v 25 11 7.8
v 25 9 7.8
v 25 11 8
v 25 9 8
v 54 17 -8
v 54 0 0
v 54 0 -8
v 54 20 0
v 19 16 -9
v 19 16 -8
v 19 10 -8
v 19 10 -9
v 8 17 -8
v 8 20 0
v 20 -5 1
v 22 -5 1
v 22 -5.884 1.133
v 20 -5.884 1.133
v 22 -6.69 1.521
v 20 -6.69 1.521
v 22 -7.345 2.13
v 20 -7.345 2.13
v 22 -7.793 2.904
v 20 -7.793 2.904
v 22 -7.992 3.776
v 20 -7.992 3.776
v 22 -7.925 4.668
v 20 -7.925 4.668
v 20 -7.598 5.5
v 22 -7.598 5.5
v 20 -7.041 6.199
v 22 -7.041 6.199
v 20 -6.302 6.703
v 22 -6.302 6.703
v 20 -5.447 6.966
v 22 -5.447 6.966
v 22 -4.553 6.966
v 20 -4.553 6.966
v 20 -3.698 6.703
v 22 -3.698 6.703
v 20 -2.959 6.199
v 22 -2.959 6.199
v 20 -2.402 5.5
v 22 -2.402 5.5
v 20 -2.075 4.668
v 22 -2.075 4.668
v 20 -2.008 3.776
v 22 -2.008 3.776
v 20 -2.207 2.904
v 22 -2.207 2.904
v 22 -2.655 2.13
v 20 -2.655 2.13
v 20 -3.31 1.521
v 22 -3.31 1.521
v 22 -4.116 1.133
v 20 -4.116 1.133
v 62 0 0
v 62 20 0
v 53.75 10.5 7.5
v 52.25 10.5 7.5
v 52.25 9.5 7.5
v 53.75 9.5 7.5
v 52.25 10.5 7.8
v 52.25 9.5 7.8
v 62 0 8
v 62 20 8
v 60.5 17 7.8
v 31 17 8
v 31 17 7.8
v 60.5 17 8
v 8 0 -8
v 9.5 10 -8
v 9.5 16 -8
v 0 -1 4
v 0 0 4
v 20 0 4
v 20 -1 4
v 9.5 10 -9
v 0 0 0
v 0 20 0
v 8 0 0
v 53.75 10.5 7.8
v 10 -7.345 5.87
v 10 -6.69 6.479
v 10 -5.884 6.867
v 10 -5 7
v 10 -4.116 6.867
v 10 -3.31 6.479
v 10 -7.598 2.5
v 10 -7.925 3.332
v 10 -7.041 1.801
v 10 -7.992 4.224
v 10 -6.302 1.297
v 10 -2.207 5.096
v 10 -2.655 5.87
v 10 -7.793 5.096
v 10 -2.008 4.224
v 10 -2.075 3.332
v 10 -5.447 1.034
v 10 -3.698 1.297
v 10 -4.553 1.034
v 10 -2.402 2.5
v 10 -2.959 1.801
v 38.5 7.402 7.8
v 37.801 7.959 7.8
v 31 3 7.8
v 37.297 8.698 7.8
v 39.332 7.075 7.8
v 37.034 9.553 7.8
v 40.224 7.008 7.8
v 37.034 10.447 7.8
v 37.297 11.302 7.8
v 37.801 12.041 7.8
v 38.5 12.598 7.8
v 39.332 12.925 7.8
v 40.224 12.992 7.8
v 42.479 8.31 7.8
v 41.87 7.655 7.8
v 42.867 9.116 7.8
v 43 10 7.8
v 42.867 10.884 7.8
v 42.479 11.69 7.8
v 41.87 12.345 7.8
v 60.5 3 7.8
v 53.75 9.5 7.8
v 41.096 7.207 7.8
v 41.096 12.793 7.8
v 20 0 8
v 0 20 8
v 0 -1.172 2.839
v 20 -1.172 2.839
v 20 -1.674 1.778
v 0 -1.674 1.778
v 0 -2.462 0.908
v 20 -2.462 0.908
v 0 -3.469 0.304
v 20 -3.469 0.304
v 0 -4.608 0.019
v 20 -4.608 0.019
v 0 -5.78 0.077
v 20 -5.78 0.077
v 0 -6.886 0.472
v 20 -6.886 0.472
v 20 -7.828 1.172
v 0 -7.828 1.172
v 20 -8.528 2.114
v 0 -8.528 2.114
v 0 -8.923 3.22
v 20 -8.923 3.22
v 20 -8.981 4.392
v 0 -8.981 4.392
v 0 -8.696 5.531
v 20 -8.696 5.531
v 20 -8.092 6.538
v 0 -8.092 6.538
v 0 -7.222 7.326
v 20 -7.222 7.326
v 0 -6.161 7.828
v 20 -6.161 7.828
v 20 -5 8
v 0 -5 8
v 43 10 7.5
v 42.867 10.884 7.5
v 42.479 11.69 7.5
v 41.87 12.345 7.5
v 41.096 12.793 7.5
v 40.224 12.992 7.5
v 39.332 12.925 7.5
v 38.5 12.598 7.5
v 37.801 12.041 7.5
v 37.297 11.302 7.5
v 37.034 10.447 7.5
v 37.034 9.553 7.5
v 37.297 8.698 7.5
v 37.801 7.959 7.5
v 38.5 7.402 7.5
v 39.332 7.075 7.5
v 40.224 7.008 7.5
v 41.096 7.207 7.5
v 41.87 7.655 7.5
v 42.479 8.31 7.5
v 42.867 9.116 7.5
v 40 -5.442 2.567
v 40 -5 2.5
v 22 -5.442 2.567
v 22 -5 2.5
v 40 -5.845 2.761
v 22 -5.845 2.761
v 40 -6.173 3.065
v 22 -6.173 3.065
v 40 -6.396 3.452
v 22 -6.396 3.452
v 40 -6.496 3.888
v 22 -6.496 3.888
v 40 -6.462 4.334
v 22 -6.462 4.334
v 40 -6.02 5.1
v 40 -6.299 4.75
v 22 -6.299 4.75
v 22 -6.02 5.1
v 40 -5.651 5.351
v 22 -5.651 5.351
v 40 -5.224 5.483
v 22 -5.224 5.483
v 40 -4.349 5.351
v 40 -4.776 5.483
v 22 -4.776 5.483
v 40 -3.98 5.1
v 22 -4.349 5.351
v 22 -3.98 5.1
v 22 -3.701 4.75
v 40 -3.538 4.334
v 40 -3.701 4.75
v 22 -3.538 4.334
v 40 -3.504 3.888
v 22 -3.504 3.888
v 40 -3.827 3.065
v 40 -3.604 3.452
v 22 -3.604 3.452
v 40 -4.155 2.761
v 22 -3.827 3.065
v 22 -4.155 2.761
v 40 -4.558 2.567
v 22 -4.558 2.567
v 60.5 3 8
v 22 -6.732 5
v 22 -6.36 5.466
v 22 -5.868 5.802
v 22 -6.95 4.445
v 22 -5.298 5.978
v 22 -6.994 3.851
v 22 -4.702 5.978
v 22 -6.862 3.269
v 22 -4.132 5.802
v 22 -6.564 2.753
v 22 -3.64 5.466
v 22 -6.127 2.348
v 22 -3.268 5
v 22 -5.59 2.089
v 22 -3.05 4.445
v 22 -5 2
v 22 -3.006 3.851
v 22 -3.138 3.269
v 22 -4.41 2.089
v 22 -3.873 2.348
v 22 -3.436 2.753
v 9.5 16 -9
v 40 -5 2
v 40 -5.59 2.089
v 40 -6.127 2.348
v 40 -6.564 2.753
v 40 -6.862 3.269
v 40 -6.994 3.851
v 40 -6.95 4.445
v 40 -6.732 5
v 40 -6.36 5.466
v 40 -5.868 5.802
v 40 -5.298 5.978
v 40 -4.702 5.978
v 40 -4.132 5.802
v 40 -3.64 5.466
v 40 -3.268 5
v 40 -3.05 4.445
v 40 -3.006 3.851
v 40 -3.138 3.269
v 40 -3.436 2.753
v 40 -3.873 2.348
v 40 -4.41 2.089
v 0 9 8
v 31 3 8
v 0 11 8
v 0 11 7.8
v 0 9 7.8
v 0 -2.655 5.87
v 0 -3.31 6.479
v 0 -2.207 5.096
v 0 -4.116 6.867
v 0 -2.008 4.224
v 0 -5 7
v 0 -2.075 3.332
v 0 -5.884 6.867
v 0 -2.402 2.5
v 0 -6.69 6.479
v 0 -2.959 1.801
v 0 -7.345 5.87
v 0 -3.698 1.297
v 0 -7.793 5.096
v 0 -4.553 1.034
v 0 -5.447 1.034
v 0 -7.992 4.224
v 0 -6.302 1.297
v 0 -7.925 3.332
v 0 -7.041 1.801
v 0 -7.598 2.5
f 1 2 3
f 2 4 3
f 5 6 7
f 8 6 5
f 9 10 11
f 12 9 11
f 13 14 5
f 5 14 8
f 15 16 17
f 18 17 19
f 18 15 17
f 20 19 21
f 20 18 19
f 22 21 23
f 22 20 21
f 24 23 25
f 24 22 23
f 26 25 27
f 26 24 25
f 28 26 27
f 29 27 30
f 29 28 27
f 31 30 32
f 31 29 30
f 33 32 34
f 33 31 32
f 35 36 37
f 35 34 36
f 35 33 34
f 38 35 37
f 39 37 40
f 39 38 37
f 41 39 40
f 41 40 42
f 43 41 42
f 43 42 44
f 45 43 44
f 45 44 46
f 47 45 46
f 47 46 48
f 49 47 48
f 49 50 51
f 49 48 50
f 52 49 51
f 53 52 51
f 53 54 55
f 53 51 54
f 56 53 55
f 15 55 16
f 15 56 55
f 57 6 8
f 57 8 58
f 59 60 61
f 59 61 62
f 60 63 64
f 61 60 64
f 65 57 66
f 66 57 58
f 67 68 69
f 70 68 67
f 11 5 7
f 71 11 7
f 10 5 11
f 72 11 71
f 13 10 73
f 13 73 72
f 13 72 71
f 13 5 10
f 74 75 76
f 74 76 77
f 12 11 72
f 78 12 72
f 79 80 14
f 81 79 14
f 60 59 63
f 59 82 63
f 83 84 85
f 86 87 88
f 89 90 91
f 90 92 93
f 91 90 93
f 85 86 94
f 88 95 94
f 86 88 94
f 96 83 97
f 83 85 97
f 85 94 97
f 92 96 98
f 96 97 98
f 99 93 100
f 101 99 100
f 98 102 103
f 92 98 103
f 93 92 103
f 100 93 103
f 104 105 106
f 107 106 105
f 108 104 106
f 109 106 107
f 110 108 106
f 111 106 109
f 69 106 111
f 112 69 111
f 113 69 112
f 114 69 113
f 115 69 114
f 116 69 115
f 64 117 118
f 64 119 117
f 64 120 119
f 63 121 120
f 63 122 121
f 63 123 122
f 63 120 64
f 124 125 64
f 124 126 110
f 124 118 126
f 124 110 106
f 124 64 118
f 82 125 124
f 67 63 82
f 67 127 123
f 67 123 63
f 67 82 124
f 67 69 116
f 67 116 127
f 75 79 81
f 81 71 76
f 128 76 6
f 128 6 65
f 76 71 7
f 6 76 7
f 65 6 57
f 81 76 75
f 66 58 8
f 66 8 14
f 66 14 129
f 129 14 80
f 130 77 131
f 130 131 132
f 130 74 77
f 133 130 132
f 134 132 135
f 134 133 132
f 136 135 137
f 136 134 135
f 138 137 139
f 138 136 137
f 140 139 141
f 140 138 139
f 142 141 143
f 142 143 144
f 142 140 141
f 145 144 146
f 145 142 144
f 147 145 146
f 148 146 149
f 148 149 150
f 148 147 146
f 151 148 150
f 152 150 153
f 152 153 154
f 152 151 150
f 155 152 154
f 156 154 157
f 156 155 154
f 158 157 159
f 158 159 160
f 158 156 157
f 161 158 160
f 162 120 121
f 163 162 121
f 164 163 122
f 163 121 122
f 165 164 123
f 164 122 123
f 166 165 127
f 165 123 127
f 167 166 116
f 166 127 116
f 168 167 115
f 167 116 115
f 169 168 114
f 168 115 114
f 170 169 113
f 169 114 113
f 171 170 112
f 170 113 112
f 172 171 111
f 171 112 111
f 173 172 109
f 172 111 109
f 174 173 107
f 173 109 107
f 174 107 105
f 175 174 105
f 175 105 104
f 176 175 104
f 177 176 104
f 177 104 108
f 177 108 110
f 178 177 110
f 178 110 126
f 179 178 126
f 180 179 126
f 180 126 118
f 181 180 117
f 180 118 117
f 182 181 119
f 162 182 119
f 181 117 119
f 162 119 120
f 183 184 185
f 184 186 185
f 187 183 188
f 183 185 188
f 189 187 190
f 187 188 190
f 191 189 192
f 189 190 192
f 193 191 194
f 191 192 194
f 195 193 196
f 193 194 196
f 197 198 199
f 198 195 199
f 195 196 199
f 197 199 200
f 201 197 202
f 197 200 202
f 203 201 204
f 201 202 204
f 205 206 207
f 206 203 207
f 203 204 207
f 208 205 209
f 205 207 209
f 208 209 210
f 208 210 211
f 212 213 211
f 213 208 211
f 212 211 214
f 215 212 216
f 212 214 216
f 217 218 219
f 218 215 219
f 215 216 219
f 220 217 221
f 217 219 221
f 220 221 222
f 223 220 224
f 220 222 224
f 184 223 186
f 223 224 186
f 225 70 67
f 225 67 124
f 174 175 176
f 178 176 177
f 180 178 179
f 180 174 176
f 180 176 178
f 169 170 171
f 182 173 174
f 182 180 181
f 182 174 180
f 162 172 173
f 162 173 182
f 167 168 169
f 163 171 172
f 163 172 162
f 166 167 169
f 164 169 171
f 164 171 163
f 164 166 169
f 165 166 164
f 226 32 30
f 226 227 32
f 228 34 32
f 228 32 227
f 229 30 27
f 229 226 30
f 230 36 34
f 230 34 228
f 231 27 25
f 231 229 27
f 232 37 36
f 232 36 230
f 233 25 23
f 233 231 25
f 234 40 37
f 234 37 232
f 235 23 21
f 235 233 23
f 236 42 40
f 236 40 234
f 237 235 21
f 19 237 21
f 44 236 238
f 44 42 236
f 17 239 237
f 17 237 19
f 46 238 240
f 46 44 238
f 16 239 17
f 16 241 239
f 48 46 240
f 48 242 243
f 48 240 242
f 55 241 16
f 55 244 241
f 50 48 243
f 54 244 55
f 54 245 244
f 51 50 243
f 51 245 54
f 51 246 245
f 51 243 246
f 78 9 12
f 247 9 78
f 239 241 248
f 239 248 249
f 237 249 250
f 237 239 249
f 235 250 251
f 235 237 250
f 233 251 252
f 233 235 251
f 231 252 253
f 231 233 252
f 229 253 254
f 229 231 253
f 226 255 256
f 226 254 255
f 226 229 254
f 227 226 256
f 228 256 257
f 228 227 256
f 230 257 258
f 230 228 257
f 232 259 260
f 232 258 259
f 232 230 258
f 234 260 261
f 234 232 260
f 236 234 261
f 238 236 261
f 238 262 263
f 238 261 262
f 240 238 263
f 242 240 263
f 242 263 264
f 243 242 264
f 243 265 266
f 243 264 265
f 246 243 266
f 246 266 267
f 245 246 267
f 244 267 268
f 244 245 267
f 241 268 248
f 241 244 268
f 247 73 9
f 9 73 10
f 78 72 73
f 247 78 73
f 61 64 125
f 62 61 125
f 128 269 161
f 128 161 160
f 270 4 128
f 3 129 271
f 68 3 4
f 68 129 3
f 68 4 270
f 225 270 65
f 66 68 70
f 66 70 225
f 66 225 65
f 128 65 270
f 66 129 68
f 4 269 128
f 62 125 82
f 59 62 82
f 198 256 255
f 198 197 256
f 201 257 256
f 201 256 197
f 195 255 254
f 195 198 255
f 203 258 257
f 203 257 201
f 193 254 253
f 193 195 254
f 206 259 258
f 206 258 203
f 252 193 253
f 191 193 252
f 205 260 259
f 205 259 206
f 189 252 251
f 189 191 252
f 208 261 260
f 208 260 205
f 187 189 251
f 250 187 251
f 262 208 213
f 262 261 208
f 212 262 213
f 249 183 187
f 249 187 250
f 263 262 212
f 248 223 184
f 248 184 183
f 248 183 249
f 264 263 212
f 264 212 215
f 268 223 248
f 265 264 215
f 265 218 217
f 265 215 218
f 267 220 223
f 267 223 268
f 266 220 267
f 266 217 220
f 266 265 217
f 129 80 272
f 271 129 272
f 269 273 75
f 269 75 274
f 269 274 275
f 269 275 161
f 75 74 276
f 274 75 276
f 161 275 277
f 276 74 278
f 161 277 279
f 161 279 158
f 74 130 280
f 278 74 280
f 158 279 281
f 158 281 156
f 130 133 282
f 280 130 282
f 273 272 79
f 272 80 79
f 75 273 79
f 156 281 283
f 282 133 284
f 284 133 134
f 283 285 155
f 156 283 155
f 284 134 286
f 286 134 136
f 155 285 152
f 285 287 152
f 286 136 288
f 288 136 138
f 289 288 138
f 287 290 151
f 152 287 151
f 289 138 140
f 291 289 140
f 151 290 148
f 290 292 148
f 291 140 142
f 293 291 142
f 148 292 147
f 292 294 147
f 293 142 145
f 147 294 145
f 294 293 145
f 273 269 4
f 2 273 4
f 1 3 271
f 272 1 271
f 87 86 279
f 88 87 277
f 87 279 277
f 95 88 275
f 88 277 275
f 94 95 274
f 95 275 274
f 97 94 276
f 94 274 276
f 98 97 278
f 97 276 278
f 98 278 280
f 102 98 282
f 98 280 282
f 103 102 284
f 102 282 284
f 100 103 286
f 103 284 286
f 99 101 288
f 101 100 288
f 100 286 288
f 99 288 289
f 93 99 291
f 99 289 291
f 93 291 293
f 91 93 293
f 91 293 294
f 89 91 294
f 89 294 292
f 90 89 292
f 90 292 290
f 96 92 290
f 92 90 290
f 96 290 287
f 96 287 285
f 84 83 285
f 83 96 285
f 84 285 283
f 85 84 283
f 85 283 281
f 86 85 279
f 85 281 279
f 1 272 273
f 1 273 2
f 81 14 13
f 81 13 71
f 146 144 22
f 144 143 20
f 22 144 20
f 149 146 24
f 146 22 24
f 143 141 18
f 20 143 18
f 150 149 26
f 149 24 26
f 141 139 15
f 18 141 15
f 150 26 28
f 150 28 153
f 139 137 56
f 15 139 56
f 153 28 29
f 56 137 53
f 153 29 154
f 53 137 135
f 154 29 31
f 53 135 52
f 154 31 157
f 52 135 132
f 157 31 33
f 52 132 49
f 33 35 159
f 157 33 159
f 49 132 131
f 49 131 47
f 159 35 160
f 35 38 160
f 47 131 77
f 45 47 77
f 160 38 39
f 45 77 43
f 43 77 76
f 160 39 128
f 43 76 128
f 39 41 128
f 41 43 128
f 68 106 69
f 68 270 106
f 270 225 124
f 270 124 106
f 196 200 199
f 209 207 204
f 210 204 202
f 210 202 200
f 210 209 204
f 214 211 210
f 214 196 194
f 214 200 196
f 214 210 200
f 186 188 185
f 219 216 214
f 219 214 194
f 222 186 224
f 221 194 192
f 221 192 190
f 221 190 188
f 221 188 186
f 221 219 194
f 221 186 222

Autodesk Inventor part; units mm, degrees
ref_plane "YZ Plane" through (0, 0, 0) normal (1, 0, 0) x (0, 1, 0)
ref_plane "XZ Plane" through (0, 0, 0) normal (0, 1, 0) x (-1, 0, 0)
ref_plane "XY Plane" through (0, 0, 0) normal (0, 0, 1) x (1, 0, 0)
sketch "スケッチ1" plane through (0, 0, 0) normal (0, 0, 1) x (1, 0, 0)
  line L0 (0, 0) -> (62, 0)
  line L1 (62, 0) -> (62, 20)
  line L2 (62, 20) -> (0, 20)
  line L3 (0, 20) -> (0, 0)
  dimension "d0" = 62
  dimension "d1" = 20
extrude "押し出し1" add sketch "スケッチ1" along normal blind 8
sketch "スケッチ2" plane through (0, 0, 0) normal (-1, 0, 0) x (0, 0, 1)
  line L0 (0, 0) -> (8, 0) projected
  line L1 (4, 0) -> (4, -1)
  line L2 (4, -1) -> (4, -5) construction
  circle A0 centre (4, -5) radius 4
  line L3 (8, 0) -> (8, -5)
  circle A1 centre (4, -5) radius 3
  dimension "d4" = 1
  dimension "d5" = 4
  dimension "d6" = 6
extrude "押し出し2" add sketch "スケッチ2" against normal blind 20
sketch "スケッチ3" plane through (20, 0, 0) normal (1, 0, 0) x (0, 0, -1)
  arc A0 (-8, -5) -> (-4, -1) centre (-4, -5) ccw construction
  line L0 (0, 0) -> (-4, 0) construction
  line L1 (-4, 0) -> (-4, -5) construction
  line L2 (-4, -5) -> (0, -5) construction
  line L3 (0, -5) -> (0, 0) construction
  circle A1 centre (-4, -5) radius 3
extrude "押し出し3" add sketch "スケッチ3" along normal blind 2 and the other way blind 10
sketch "スケッチ4" plane through (22, -5, 4) normal (1, 0, 0) x (0, 0, -1)
  circle A0 centre (0, 0) radius 2
  circle A1 centre (0, 0) radius 1.5
  point P0 (4, 5)
  dimension "d13" = 4
  dimension "d14" = 3
extrude "押し出し4" add sketch "スケッチ4" along normal blind 18
sketch "スケッチ5" plane through (0, 0, 0) normal (0, 0, -1) x (-1, 0, 0)
  line L0 (0, 0) -> (-62, 0) construction
  line L1 (0, 0) -> (-8, 0) construction
  line L2 (-62, 0) -> (-54, 0) construction
  line L3 (-62, 20) -> (0, 20) projected
  line L4 (-8, 0) -> (-54, 0)
  line L5 (-54, 0) -> (-54, 20)
  line L6 (-54, 20) -> (-8, 20)
  line L7 (-8, 20) -> (-8, 0)
  dimension "d17" = 8
  dimension "d18" = 8
extrude "押し出し5" add sketch "スケッチ5" along normal blind 8
chamfer "面取り1" distance 3 distance2 8 1 edges at (31, 20, -8) measured on face at (23.3333, 6.6667, -8)
sketch "スケッチ6" plane through (0, 0, -8) normal (0, 0, -1) x (-1, 0, 0)
  line L0 (-54, 17) -> (-8, 17) construction
  line L1 (-8, 17) -> (-9.5, 17) construction
  line L2 (-9.5, 17) -> (-9.5, 16) construction
  line L3 (-9.5, 16) -> (-8, 16) construction
  line L4 (-8, 16) -> (-8, 17) construction
  line L5 (-9.5, 16) -> (-19, 16)
  line L6 (-19, 16) -> (-19, 10)
  line L7 (-19, 10) -> (-9.5, 10)
  line L8 (-9.5, 10) -> (-9.5, 16)
  point P0 (0, 0)
  dimension "d26" = 9.5
  dimension "d27" = 6
  dimension "d28" = 1.5
  dimension "d29" = 1
extrude "押し出し6" add sketch "スケッチ6" along normal blind 1
sketch "スケッチ7" plane through (0, 0, 8) normal (0, 0, 1) x (1, 0, 0)
  line L0 (0, 0) -> (0, 9) construction
  line L1 (0, 20) -> (0, 0) construction
  line L2 (0, 9) -> (25, 9)
  line L3 (25, 9) -> (25, 11)
  line L4 (25, 11) -> (0, 11)
  line L5 (0, 11) -> (0, 9)
  line L6 (20, 0) -> (62, 0) construction
  line L7 (62, 0) -> (60.5, 0) construction
  line L8 (60.5, 0) -> (60.5, 3) construction
  line L9 (60.5, 3) -> (62, 3) construction
  line L10 (62, 3) -> (62, 0) construction
  line L11 (60.5, 3) -> (31, 3)
  line L12 (31, 3) -> (31, 17)
  line L13 (31, 17) -> (60.5, 17)
  line L14 (60.5, 17) -> (60.5, 3)
  dimension "d32" = 9
  dimension "d33" = 25
  dimension "d34" = 2
  dimension "d37" = 1.5
  dimension "d38" = 3
  dimension "d39" = 29.5
  dimension "d40" = 14
extrude "押し出し8" cut sketch "スケッチ7" against normal blind 0.2
sketch "スケッチ9" plane through (0, 0, 7.8) normal (0, 0, 1) x (1, 0, 0)
  line L0 (31, 3) -> (31, 17) construction
  line L1 (31, 10) -> (40, 10) construction
  circle A0 centre (40, 10) radius 3
  line L2 (60.5, 17) -> (60.5, 3) construction
  line L3 (60.5, 10) -> (53, 10) construction
  line L4 (52.25, 9.5) -> (53.75, 9.5)
  line L5 (53.75, 9.5) -> (53.75, 10.5)
  line L6 (53.75, 10.5) -> (52.25, 10.5)
  line L7 (52.25, 10.5) -> (52.25, 9.5)
  line L8 (52.25, 9.5) -> (53.75, 10.5) construction
  line L9 (53.75, 9.5) -> (52.25, 10.5) construction
  point P0 (0, 0)
  dimension "d43" = 9
  dimension "d44" = 6
  dimension "d45" = 7.5
  dimension "d46" = 1.5
  dimension "d47" = 1
extrude "押し出し9" cut sketch "スケッチ9" against normal blind 0.3
thread "ねじ1" size "M3x0.5" class "6H" standard "ANSI Metric M Profile" full length
properties part number "UCAM-DLI500TNBK"
